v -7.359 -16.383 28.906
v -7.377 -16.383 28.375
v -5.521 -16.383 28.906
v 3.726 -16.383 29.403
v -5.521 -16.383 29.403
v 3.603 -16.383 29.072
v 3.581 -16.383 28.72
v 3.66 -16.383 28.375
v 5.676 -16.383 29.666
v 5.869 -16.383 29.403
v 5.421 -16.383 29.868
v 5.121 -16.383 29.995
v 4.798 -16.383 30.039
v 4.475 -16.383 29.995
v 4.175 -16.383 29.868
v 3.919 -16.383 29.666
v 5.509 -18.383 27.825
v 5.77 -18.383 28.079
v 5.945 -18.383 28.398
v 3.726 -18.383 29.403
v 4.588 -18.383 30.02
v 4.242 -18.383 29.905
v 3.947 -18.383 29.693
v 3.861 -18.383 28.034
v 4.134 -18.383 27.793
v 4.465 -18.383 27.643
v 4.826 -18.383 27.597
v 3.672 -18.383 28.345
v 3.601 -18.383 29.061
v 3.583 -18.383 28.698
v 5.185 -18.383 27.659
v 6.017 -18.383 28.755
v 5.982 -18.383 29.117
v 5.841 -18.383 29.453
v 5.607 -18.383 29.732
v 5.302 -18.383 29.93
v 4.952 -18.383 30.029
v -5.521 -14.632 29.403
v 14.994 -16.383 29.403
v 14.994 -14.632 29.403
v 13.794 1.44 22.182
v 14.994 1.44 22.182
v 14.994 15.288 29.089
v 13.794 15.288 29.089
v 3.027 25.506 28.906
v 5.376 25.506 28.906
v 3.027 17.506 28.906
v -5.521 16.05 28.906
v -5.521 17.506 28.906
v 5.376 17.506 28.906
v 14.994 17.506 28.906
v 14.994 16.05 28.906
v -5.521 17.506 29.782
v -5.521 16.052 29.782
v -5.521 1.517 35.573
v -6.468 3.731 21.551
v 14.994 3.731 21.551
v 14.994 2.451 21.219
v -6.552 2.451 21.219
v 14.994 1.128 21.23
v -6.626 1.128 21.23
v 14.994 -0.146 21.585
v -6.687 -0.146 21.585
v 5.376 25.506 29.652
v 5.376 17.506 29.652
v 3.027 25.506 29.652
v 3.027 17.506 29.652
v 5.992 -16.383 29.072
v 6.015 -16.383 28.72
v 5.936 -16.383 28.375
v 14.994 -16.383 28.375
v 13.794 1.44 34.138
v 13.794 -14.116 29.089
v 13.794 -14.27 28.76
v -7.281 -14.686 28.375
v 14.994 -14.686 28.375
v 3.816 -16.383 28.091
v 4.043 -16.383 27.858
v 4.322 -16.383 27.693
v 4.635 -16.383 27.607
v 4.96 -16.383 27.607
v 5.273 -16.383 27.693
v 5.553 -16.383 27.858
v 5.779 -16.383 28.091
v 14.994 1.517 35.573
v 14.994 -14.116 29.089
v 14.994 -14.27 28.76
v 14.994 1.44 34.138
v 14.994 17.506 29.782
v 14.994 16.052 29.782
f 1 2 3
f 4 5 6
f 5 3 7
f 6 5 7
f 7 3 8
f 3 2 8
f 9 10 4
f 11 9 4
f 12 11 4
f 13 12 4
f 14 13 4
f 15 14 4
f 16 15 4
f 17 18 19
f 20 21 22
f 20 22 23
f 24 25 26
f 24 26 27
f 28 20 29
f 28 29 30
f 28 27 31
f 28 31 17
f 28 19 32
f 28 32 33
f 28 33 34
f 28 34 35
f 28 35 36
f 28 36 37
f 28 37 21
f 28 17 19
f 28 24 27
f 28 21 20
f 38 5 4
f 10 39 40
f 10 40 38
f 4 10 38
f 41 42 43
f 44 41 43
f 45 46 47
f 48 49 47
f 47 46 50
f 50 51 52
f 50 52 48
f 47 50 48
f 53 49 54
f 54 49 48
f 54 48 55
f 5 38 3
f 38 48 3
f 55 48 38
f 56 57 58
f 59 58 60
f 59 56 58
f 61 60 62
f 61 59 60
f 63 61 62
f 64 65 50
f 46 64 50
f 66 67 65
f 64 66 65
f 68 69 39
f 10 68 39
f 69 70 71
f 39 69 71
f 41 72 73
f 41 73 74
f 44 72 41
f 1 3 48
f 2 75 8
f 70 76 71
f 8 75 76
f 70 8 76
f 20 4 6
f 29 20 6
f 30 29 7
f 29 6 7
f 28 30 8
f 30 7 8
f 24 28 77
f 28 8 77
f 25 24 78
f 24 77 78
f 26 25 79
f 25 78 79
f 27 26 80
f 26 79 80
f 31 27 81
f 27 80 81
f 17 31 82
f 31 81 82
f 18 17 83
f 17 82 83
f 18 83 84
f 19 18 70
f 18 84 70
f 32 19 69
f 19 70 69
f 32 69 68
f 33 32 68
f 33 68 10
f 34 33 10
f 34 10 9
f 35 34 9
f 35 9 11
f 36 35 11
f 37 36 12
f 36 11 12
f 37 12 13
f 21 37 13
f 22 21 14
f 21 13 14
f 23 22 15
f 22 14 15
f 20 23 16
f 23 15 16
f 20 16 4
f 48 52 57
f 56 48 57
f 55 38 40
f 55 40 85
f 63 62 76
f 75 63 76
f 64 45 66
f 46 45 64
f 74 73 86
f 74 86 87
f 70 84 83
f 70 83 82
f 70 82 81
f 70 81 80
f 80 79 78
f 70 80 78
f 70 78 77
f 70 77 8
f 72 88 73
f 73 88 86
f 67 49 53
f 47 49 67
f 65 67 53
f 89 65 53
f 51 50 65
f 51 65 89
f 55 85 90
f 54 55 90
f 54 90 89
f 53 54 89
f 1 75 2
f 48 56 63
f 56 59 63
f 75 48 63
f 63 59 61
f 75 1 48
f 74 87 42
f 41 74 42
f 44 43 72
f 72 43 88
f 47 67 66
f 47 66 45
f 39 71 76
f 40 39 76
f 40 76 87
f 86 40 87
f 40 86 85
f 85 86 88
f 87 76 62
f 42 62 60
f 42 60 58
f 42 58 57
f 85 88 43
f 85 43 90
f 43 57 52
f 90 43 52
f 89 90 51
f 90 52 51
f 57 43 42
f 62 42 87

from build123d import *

# Parameters (mm, degrees)
SKETCH4_W           = 62.83623107
SKETCH4_H           = 84.722256574
BOSS_EXTRUDE2_DEPTH = 50
CUT_EXTRUDE2_DEPTH  = 80
CUT_EXTRUDE3_DEPTH  = 80
CUT_EXTRUDE5_DEPTH  = 80
CUT_EXTRUDE6_DEPTH  = 3
CUT_EXTRUDE8_DEPTH  = 80
CUT_EXTRUDE9_DEPTH  = 80
SKETCH11_W          = 5.870888161
SKETCH11_H          = 1.865764547
BOSS_EXTRUDE3_DEPTH = 20
SCALE1_SCALE        = 0.5
SCALE2_SCALE        = 0.4
SCALE3_SCALE        = 0.5
SCALE5_SCALE        = 4
SKETCH13_R          = 1.221118876
BOSS_EXTRUDE4_DEPTH = 2


with BuildPart() as part:
    # Sketch4 → Boss-Extrude2 (new body)
    with BuildSketch(Plane.XY):
        Rectangle(SKETCH4_W, SKETCH4_H)
    extrude(amount=BOSS_EXTRUDE2_DEPTH)

    # Sketch5 → Cut-Extrude2 (cut)
    with BuildSketch(Plane(origin=(31.418115535, 0, 0), x_dir=(0, 0, -1), z_dir=(1, 0, 0))):
        Polygon((-31.846034257, 38.728174008), (-31.846034257, 42.361128287), (-50, 42.361128287), (-50, -42.361128287), (-30.898434646, -42.361128287), (-30.898434646, -37.982426726), (-46.322270236, 2.38891709), align=None)
    extrude(amount=-CUT_EXTRUDE2_DEPTH, mode=Mode.SUBTRACT)

    # Sketch6 → Cut-Extrude3 (cut)
    with BuildSketch(Plane(origin=(31.418115535, 0, 0), x_dir=(0, 0, -1), z_dir=(1, 0, 0))):
        Polygon((-29.655383969, 42.361128287), (-29.655383969, 38.722554473), (-8.776416022, 3.750158878), (-28.328453067, -38.117745), (-28.328453067, -42.361128287), (-27.677514405, -46.625913761), (16.839811583, -52.045359618), (10.267667228, 27.190343951), (3.73953172, 54.484047391), align=None)
    extrude(amount=-CUT_EXTRUDE3_DEPTH, mode=Mode.SUBTRACT)

    # Sketch7 → Cut-Extrude5 (cut)
    with BuildSketch(Plane.ZY.offset(31.418115535)):
        with BuildLine():
            ThreePointArc((13.228873585, 11.208051798), (10.417703783, 4.563945687), (11.71087014, -2.533556863))
            ThreePointArc((11.71087014, -2.533556863), (0.747619784, 5.632177302), (13.228873585, 11.208051798))
        make_face()
    extrude(amount=-CUT_EXTRUDE5_DEPTH, mode=Mode.SUBTRACT)

    # Sketch8 → Cut-Extrude6 (cut)
    with BuildSketch(Plane(origin=(31.418115535, 0, 0), x_dir=(0, 0, -1), z_dir=(1, 0, 0))):
        Polygon((-30.111598921, 36.817435747), (-42.735074125, 2.19595341), (-30.111598921, -36.694083179), (-29.289064541, -37.07820135), (-12.845557678, 2.19595341), align=None)
    extrude(amount=-CUT_EXTRUDE6_DEPTH, mode=Mode.SUBTRACT)

    # Sketch9 → Cut-Extrude8 (cut)
    with BuildSketch(Plane(origin=(0, 0, 29.655383969), x_dir=(-1, 0, 0), z_dir=(0, 0, -1))):
        Polygon((19.869908303, 42.361128287), (19.869908303, 38.722554473), (19.869908303, 5.586987563), (19.869908303, -4.186945454), (19.869908303, -38.208459621), (19.869908303, -42.059759196), (19.869908303, -47.026854784), (41.256673117, -49.585938288), (42.081255469, -21.197702537), (42.081255469, 12.428184914), (37.482224788, 37.513066745), (31.418115535, 49.4837873), align=None)
    extrude(amount=-CUT_EXTRUDE8_DEPTH, mode=Mode.SUBTRACT)

    # Sketch10 → Cut-Extrude9 (cut)
    with BuildSketch(Plane(origin=(0, -2.877407212, 4.819674209), x_dir=(-1, 0, 0), z_dir=(0, 0.5126085745439567, -0.8586224136976701))):
        Polygon((19.869908303, 48.44965729), (25.693686727, -39.803296282), (32.448126733, -43.444815965), (49.802642339, -43.444815965), (32.448126733, 57.840856492), align=None)
    extrude(amount=-CUT_EXTRUDE9_DEPTH, mode=Mode.SUBTRACT)

    # Sketch11 → Boss-Extrude3 (add)
    with BuildSketch(Plane(origin=(0, 42.361128287, 0), x_dir=(1, 0, 0), z_dir=(0, 1, 0))):
        with Locations((4.437413085, -30.588266243)):
            Rectangle(SKETCH11_W, SKETCH11_H)
    extrude(amount=BOSS_EXTRUDE3_DEPTH)


with BuildPart() as part_1:
    # Scale1: scaled about (4.044501914, 0.935318094, 28.406526913)
    add(part.part.scale(SCALE1_SCALE).moved(Location((2.022250957, 0.467659047, 14.203263457))))


with BuildPart() as part_2:
    # Scale2: scaled about (4.044501914, 0.935318094, 28.406526913)
    add(part_1.part.scale(SCALE2_SCALE).moved(Location((2.426701148, 0.561190856, 17.043916148))))


with BuildPart() as part_3:
    # Scale3: scaled about (4.044501914, 0.935318094, 28.406526913)
    add(part_2.part.scale(SCALE3_SCALE).moved(Location((2.022250957, 0.467659047, 14.203263457))))


with BuildPart() as part_4:
    # Scale5: scaled about (4.044501914, 0.935318094, 28.406526913)
    add(part_3.part.scale(SCALE5_SCALE).moved(Location((-12.133505742, -2.805954282, -85.219580739))))


with BuildPart() as boss_extrude4_tool:
    # Sketch13 → Boss-Extrude4 (new body)
    with BuildSketch(Plane(origin=(0, -16.38326151, 0), x_dir=(-1, 0, 0), z_dir=(0, -1, 0))):
        with Locations(Location((-4.797778916, -28.817556161, 0), (0, 0, 331.33607571))):
            Circle(SKETCH13_R)
    extrude(amount=BOSS_EXTRUDE4_DEPTH)


with BuildPart() as part_5:
    add(part_4.part)


with BuildPart() as part_6:
    # Boss-Extrude4: joined with boss_extrude4_tool
    add(part_5.part.fuse(boss_extrude4_tool.part, tol=0.00001))


solid = part_6.part
